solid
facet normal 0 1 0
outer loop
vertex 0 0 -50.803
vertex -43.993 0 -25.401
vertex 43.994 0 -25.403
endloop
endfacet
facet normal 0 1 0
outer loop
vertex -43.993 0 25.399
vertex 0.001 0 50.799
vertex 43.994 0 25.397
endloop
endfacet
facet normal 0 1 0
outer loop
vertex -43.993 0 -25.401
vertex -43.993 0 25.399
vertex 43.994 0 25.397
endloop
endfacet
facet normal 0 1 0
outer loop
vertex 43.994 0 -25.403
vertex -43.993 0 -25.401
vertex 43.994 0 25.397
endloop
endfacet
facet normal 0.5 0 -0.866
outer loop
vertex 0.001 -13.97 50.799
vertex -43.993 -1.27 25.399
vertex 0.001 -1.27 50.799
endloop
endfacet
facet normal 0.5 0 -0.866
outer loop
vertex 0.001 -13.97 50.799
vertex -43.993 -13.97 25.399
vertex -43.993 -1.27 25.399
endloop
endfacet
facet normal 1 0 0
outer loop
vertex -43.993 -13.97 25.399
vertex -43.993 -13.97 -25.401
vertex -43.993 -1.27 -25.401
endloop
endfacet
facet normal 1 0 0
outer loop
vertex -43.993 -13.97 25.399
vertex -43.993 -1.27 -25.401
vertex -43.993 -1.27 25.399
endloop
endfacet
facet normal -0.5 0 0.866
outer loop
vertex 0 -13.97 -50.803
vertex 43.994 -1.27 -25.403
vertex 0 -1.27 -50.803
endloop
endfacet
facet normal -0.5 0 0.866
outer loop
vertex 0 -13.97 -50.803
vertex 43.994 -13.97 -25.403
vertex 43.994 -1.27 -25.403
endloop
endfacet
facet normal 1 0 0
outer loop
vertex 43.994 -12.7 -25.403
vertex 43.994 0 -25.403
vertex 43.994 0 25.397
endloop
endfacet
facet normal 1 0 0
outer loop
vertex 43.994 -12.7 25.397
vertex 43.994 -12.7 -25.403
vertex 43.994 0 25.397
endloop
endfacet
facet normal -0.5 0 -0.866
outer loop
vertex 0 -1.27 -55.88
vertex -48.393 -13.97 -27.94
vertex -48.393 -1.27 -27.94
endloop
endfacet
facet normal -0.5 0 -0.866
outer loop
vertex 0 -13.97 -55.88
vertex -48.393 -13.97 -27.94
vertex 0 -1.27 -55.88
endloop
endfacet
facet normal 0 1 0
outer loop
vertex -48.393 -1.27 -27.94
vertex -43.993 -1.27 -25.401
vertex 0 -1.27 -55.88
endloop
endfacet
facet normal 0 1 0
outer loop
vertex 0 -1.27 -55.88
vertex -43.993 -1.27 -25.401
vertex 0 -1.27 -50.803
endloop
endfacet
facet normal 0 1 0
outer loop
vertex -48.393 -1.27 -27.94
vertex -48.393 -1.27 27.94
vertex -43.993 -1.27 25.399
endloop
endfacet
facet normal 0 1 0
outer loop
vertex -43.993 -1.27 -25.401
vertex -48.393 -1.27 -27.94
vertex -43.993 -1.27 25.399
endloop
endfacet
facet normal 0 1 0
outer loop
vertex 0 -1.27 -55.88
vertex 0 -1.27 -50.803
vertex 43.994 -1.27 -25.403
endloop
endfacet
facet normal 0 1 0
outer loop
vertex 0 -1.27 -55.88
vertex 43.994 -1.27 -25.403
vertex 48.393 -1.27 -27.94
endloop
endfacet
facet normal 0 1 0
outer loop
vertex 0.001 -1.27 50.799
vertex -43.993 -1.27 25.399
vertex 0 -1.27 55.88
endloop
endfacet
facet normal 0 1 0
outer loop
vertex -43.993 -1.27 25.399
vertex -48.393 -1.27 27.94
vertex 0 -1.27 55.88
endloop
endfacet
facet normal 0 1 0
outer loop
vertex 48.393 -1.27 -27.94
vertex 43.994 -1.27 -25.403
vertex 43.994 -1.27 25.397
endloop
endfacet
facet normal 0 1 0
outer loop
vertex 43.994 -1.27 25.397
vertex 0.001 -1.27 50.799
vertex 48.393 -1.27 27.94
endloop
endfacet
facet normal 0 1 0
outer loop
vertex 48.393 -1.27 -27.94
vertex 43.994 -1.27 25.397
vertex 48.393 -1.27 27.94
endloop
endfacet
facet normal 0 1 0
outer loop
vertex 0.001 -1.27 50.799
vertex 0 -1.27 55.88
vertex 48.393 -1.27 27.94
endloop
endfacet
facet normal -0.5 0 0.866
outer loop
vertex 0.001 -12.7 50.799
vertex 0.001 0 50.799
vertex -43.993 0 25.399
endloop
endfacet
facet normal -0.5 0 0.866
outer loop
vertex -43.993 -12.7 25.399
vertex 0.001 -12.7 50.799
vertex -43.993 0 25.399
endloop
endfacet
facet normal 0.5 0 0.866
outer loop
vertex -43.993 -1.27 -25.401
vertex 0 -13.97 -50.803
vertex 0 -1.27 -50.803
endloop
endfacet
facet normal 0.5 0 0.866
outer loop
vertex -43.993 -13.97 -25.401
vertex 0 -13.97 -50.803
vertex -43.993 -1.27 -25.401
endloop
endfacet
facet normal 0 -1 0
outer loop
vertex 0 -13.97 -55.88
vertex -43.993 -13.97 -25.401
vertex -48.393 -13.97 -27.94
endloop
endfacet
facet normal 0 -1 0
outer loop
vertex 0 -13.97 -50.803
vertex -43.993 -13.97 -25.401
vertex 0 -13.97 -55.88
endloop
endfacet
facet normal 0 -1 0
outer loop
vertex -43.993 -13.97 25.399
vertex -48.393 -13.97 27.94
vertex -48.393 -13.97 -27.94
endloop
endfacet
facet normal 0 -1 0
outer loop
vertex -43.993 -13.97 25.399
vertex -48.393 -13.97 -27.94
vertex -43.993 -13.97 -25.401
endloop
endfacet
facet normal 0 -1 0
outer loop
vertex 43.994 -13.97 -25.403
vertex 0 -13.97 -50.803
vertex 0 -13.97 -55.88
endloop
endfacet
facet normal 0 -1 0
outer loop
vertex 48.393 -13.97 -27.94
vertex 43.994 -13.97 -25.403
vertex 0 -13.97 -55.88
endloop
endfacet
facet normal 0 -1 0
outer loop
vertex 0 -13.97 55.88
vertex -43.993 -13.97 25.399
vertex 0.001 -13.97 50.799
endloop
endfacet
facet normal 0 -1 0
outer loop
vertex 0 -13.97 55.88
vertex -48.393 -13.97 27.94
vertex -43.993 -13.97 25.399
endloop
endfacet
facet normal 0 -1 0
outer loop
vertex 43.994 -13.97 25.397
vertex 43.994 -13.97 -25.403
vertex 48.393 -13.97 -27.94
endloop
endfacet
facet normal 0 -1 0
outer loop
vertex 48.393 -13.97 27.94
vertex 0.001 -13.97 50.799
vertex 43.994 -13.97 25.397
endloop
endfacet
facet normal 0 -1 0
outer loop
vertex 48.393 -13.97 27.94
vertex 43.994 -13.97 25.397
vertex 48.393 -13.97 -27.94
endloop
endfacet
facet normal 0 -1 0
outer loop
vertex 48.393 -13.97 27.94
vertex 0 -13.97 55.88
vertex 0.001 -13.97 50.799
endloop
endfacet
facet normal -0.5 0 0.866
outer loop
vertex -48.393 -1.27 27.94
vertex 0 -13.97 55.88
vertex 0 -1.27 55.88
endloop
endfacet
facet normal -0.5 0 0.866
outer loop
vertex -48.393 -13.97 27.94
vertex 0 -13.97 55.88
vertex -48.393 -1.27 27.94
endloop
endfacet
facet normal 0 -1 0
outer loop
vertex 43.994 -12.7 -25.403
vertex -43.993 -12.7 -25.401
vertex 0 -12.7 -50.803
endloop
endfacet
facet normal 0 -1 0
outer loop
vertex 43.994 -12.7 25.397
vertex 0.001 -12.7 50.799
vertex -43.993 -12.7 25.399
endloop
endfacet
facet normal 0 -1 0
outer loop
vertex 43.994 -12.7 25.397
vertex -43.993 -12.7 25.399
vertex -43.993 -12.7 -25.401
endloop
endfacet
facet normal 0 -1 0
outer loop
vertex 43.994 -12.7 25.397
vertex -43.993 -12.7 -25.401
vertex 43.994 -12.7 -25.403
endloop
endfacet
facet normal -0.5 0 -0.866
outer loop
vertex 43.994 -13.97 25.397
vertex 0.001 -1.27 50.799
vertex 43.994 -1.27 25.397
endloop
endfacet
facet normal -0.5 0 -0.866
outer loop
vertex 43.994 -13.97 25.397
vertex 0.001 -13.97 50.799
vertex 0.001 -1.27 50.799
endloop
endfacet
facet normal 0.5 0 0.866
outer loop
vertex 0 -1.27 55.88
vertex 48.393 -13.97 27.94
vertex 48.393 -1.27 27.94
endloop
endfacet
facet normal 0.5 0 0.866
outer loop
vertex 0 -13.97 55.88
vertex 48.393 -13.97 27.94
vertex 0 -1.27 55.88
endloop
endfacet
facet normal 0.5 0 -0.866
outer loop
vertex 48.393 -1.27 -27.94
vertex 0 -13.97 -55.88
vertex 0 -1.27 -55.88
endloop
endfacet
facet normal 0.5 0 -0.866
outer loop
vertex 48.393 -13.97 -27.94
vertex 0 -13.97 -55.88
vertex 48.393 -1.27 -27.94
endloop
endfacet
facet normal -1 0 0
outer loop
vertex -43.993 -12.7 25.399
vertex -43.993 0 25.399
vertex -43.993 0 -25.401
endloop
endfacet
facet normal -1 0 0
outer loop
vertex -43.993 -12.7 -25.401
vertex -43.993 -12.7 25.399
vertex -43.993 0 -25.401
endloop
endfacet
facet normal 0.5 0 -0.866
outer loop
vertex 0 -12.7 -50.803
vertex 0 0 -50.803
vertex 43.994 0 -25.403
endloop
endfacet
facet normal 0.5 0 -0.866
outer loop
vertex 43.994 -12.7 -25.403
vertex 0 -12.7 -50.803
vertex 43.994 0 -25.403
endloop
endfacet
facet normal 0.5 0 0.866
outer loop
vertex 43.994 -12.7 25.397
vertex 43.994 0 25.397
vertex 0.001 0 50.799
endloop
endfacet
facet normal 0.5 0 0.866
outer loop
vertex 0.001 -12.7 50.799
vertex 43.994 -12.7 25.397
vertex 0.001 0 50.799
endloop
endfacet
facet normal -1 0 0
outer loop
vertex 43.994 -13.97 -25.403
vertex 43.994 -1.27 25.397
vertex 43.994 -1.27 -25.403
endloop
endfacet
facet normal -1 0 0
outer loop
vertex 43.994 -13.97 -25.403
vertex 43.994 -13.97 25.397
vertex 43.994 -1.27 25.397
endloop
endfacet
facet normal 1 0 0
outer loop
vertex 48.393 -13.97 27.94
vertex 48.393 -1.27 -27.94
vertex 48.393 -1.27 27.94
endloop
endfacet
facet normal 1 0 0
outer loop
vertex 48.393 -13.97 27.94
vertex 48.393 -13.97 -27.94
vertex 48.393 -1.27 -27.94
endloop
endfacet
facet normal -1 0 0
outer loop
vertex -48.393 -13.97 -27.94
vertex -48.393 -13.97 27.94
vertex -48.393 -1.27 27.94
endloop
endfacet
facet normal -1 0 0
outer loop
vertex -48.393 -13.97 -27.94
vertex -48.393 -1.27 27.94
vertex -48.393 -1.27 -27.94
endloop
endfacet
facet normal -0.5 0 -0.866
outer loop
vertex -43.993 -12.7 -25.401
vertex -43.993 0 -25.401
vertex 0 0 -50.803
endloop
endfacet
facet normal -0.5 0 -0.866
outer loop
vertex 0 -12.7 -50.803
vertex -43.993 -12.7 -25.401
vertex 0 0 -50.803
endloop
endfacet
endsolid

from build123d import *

# Parameters (mm, degrees)
F1_DEPTH = 12.7
F3_DEPTH = 1.27
F4_DEPTH = 11.43


with BuildPart() as f1:
    # F0 (on Front) → F1 (new body)
    with BuildSketch(Plane.XZ):
        Polygon((0.0012905122, 50.7992549224), (-43.9928, 25.3992549224), (-43.9928, -25.4007450776), (-7.57e-08, -50.8029803104), (43.9940904365, -25.4029803104), (43.9940904365, 25.3970196896), align=None)
    extrude(amount=F1_DEPTH)


with BuildPart() as f3:
    # F2 (on face) → F3 (new body)
    with BuildSketch(Plane.XZ.offset(12.7)):
        Polygon((48.3934995635, 27.94), (0, 55.88), (-48.3934995635, 27.94), (-48.3934995635, -27.94), (0, -55.88), (48.3934995635, -27.94), align=None)
        Polygon((-43.9928, -25.4007450776), (-43.9928, 25.3992549224), (0.0012905122, 50.7992549224), (43.9940904365, 25.3970196896), (43.9940904365, -25.4029803104), (-7.57e-08, -50.8029803104), align=None, mode=Mode.SUBTRACT)
    extrude(amount=F3_DEPTH)

    # F4 (add): a face of the model
    f4_faces = [f3.faces().sort_by_distance(p)[0] for p in [
        (46.9150537309, -12.7, 0),
    ]]
    extrude(f4_faces, amount=F4_DEPTH)


solid = Compound([f1.part, f3.part])
